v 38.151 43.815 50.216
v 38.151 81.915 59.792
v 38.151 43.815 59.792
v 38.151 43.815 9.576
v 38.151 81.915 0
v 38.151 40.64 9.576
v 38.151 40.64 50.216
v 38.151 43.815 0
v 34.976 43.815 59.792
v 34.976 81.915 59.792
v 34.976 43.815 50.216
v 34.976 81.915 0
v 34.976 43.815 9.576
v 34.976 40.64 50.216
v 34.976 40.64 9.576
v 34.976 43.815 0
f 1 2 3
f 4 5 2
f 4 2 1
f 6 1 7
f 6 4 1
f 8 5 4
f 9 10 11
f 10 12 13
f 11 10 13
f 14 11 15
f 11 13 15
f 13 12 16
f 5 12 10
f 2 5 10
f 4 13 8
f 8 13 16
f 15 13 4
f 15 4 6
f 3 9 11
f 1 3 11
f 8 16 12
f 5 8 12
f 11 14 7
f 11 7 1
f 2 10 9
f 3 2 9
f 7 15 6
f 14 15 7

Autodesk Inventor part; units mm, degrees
ref_plane "YZ Plane" through (0, 0, 0) normal (1, 0, 0) x (0, 1, 0)
ref_plane "XZ Plane" through (0, 0, 0) normal (0, 1, 0) x (-1, 0, 0)
ref_plane "XY Plane" through (0, 0, 0) normal (0, 0, 1) x (1, 0, 0)
sketch "Sketch1" plane through (0, 0, 0) normal (0, 0, 1) x (1, 0, 0)
  line L0 (0, 0) -> (-3.175, 0)
  line L1 (-3.175, 0) -> (-3.175, 40.64)
  line L2 (-3.175, 40.64) -> (0, 40.64)
  line L3 (0, 40.64) -> (0, 0)
  line L4 (-41.275, -9.5758) -> (-3.175, -9.5758)
  line L5 (-3.175, -9.5758) -> (-3.175, 50.2158)
  line L6 (-3.175, 50.2158) -> (-41.275, 50.2158)
  line L7 (-41.275, 50.2158) -> (-41.275, -9.5758)
  point P0 (-22.225, 50.2158)
  point P1 (-22.225, -9.5758)
  point P2 (-3.175, 0)
  point P3 (-3.175, 40.64)
  dimension "d0" = 3.175
  dimension "d1" = 40.64
  dimension "d2" = 59.7916
  dimension "d3" = 9.5758
  dimension "d5" = 38.1
  dimension "d6" = 0
extrude "Extrusion1" add sketch "Sketch1" along normal blind 3.175
move or copy body "Move Body1" bodies to move or copy 1 copy no rotation origin (0, 0, 0) rotation axis (0, 0, 1) rotation angle -90 translate (-40.64, 40.64, 0)
move or copy body "Move Body2" bodies to move or copy 1 copy no rotation origin (0, 0, 0) rotation axis (0, -1, 0) rotation angle -90 translate (9.5758, 0, 9.5758)
move or copy body "Move Body3" bodies to move or copy 1 copy no translate (25.4, 0, 0)
properties part number "servo long side"
